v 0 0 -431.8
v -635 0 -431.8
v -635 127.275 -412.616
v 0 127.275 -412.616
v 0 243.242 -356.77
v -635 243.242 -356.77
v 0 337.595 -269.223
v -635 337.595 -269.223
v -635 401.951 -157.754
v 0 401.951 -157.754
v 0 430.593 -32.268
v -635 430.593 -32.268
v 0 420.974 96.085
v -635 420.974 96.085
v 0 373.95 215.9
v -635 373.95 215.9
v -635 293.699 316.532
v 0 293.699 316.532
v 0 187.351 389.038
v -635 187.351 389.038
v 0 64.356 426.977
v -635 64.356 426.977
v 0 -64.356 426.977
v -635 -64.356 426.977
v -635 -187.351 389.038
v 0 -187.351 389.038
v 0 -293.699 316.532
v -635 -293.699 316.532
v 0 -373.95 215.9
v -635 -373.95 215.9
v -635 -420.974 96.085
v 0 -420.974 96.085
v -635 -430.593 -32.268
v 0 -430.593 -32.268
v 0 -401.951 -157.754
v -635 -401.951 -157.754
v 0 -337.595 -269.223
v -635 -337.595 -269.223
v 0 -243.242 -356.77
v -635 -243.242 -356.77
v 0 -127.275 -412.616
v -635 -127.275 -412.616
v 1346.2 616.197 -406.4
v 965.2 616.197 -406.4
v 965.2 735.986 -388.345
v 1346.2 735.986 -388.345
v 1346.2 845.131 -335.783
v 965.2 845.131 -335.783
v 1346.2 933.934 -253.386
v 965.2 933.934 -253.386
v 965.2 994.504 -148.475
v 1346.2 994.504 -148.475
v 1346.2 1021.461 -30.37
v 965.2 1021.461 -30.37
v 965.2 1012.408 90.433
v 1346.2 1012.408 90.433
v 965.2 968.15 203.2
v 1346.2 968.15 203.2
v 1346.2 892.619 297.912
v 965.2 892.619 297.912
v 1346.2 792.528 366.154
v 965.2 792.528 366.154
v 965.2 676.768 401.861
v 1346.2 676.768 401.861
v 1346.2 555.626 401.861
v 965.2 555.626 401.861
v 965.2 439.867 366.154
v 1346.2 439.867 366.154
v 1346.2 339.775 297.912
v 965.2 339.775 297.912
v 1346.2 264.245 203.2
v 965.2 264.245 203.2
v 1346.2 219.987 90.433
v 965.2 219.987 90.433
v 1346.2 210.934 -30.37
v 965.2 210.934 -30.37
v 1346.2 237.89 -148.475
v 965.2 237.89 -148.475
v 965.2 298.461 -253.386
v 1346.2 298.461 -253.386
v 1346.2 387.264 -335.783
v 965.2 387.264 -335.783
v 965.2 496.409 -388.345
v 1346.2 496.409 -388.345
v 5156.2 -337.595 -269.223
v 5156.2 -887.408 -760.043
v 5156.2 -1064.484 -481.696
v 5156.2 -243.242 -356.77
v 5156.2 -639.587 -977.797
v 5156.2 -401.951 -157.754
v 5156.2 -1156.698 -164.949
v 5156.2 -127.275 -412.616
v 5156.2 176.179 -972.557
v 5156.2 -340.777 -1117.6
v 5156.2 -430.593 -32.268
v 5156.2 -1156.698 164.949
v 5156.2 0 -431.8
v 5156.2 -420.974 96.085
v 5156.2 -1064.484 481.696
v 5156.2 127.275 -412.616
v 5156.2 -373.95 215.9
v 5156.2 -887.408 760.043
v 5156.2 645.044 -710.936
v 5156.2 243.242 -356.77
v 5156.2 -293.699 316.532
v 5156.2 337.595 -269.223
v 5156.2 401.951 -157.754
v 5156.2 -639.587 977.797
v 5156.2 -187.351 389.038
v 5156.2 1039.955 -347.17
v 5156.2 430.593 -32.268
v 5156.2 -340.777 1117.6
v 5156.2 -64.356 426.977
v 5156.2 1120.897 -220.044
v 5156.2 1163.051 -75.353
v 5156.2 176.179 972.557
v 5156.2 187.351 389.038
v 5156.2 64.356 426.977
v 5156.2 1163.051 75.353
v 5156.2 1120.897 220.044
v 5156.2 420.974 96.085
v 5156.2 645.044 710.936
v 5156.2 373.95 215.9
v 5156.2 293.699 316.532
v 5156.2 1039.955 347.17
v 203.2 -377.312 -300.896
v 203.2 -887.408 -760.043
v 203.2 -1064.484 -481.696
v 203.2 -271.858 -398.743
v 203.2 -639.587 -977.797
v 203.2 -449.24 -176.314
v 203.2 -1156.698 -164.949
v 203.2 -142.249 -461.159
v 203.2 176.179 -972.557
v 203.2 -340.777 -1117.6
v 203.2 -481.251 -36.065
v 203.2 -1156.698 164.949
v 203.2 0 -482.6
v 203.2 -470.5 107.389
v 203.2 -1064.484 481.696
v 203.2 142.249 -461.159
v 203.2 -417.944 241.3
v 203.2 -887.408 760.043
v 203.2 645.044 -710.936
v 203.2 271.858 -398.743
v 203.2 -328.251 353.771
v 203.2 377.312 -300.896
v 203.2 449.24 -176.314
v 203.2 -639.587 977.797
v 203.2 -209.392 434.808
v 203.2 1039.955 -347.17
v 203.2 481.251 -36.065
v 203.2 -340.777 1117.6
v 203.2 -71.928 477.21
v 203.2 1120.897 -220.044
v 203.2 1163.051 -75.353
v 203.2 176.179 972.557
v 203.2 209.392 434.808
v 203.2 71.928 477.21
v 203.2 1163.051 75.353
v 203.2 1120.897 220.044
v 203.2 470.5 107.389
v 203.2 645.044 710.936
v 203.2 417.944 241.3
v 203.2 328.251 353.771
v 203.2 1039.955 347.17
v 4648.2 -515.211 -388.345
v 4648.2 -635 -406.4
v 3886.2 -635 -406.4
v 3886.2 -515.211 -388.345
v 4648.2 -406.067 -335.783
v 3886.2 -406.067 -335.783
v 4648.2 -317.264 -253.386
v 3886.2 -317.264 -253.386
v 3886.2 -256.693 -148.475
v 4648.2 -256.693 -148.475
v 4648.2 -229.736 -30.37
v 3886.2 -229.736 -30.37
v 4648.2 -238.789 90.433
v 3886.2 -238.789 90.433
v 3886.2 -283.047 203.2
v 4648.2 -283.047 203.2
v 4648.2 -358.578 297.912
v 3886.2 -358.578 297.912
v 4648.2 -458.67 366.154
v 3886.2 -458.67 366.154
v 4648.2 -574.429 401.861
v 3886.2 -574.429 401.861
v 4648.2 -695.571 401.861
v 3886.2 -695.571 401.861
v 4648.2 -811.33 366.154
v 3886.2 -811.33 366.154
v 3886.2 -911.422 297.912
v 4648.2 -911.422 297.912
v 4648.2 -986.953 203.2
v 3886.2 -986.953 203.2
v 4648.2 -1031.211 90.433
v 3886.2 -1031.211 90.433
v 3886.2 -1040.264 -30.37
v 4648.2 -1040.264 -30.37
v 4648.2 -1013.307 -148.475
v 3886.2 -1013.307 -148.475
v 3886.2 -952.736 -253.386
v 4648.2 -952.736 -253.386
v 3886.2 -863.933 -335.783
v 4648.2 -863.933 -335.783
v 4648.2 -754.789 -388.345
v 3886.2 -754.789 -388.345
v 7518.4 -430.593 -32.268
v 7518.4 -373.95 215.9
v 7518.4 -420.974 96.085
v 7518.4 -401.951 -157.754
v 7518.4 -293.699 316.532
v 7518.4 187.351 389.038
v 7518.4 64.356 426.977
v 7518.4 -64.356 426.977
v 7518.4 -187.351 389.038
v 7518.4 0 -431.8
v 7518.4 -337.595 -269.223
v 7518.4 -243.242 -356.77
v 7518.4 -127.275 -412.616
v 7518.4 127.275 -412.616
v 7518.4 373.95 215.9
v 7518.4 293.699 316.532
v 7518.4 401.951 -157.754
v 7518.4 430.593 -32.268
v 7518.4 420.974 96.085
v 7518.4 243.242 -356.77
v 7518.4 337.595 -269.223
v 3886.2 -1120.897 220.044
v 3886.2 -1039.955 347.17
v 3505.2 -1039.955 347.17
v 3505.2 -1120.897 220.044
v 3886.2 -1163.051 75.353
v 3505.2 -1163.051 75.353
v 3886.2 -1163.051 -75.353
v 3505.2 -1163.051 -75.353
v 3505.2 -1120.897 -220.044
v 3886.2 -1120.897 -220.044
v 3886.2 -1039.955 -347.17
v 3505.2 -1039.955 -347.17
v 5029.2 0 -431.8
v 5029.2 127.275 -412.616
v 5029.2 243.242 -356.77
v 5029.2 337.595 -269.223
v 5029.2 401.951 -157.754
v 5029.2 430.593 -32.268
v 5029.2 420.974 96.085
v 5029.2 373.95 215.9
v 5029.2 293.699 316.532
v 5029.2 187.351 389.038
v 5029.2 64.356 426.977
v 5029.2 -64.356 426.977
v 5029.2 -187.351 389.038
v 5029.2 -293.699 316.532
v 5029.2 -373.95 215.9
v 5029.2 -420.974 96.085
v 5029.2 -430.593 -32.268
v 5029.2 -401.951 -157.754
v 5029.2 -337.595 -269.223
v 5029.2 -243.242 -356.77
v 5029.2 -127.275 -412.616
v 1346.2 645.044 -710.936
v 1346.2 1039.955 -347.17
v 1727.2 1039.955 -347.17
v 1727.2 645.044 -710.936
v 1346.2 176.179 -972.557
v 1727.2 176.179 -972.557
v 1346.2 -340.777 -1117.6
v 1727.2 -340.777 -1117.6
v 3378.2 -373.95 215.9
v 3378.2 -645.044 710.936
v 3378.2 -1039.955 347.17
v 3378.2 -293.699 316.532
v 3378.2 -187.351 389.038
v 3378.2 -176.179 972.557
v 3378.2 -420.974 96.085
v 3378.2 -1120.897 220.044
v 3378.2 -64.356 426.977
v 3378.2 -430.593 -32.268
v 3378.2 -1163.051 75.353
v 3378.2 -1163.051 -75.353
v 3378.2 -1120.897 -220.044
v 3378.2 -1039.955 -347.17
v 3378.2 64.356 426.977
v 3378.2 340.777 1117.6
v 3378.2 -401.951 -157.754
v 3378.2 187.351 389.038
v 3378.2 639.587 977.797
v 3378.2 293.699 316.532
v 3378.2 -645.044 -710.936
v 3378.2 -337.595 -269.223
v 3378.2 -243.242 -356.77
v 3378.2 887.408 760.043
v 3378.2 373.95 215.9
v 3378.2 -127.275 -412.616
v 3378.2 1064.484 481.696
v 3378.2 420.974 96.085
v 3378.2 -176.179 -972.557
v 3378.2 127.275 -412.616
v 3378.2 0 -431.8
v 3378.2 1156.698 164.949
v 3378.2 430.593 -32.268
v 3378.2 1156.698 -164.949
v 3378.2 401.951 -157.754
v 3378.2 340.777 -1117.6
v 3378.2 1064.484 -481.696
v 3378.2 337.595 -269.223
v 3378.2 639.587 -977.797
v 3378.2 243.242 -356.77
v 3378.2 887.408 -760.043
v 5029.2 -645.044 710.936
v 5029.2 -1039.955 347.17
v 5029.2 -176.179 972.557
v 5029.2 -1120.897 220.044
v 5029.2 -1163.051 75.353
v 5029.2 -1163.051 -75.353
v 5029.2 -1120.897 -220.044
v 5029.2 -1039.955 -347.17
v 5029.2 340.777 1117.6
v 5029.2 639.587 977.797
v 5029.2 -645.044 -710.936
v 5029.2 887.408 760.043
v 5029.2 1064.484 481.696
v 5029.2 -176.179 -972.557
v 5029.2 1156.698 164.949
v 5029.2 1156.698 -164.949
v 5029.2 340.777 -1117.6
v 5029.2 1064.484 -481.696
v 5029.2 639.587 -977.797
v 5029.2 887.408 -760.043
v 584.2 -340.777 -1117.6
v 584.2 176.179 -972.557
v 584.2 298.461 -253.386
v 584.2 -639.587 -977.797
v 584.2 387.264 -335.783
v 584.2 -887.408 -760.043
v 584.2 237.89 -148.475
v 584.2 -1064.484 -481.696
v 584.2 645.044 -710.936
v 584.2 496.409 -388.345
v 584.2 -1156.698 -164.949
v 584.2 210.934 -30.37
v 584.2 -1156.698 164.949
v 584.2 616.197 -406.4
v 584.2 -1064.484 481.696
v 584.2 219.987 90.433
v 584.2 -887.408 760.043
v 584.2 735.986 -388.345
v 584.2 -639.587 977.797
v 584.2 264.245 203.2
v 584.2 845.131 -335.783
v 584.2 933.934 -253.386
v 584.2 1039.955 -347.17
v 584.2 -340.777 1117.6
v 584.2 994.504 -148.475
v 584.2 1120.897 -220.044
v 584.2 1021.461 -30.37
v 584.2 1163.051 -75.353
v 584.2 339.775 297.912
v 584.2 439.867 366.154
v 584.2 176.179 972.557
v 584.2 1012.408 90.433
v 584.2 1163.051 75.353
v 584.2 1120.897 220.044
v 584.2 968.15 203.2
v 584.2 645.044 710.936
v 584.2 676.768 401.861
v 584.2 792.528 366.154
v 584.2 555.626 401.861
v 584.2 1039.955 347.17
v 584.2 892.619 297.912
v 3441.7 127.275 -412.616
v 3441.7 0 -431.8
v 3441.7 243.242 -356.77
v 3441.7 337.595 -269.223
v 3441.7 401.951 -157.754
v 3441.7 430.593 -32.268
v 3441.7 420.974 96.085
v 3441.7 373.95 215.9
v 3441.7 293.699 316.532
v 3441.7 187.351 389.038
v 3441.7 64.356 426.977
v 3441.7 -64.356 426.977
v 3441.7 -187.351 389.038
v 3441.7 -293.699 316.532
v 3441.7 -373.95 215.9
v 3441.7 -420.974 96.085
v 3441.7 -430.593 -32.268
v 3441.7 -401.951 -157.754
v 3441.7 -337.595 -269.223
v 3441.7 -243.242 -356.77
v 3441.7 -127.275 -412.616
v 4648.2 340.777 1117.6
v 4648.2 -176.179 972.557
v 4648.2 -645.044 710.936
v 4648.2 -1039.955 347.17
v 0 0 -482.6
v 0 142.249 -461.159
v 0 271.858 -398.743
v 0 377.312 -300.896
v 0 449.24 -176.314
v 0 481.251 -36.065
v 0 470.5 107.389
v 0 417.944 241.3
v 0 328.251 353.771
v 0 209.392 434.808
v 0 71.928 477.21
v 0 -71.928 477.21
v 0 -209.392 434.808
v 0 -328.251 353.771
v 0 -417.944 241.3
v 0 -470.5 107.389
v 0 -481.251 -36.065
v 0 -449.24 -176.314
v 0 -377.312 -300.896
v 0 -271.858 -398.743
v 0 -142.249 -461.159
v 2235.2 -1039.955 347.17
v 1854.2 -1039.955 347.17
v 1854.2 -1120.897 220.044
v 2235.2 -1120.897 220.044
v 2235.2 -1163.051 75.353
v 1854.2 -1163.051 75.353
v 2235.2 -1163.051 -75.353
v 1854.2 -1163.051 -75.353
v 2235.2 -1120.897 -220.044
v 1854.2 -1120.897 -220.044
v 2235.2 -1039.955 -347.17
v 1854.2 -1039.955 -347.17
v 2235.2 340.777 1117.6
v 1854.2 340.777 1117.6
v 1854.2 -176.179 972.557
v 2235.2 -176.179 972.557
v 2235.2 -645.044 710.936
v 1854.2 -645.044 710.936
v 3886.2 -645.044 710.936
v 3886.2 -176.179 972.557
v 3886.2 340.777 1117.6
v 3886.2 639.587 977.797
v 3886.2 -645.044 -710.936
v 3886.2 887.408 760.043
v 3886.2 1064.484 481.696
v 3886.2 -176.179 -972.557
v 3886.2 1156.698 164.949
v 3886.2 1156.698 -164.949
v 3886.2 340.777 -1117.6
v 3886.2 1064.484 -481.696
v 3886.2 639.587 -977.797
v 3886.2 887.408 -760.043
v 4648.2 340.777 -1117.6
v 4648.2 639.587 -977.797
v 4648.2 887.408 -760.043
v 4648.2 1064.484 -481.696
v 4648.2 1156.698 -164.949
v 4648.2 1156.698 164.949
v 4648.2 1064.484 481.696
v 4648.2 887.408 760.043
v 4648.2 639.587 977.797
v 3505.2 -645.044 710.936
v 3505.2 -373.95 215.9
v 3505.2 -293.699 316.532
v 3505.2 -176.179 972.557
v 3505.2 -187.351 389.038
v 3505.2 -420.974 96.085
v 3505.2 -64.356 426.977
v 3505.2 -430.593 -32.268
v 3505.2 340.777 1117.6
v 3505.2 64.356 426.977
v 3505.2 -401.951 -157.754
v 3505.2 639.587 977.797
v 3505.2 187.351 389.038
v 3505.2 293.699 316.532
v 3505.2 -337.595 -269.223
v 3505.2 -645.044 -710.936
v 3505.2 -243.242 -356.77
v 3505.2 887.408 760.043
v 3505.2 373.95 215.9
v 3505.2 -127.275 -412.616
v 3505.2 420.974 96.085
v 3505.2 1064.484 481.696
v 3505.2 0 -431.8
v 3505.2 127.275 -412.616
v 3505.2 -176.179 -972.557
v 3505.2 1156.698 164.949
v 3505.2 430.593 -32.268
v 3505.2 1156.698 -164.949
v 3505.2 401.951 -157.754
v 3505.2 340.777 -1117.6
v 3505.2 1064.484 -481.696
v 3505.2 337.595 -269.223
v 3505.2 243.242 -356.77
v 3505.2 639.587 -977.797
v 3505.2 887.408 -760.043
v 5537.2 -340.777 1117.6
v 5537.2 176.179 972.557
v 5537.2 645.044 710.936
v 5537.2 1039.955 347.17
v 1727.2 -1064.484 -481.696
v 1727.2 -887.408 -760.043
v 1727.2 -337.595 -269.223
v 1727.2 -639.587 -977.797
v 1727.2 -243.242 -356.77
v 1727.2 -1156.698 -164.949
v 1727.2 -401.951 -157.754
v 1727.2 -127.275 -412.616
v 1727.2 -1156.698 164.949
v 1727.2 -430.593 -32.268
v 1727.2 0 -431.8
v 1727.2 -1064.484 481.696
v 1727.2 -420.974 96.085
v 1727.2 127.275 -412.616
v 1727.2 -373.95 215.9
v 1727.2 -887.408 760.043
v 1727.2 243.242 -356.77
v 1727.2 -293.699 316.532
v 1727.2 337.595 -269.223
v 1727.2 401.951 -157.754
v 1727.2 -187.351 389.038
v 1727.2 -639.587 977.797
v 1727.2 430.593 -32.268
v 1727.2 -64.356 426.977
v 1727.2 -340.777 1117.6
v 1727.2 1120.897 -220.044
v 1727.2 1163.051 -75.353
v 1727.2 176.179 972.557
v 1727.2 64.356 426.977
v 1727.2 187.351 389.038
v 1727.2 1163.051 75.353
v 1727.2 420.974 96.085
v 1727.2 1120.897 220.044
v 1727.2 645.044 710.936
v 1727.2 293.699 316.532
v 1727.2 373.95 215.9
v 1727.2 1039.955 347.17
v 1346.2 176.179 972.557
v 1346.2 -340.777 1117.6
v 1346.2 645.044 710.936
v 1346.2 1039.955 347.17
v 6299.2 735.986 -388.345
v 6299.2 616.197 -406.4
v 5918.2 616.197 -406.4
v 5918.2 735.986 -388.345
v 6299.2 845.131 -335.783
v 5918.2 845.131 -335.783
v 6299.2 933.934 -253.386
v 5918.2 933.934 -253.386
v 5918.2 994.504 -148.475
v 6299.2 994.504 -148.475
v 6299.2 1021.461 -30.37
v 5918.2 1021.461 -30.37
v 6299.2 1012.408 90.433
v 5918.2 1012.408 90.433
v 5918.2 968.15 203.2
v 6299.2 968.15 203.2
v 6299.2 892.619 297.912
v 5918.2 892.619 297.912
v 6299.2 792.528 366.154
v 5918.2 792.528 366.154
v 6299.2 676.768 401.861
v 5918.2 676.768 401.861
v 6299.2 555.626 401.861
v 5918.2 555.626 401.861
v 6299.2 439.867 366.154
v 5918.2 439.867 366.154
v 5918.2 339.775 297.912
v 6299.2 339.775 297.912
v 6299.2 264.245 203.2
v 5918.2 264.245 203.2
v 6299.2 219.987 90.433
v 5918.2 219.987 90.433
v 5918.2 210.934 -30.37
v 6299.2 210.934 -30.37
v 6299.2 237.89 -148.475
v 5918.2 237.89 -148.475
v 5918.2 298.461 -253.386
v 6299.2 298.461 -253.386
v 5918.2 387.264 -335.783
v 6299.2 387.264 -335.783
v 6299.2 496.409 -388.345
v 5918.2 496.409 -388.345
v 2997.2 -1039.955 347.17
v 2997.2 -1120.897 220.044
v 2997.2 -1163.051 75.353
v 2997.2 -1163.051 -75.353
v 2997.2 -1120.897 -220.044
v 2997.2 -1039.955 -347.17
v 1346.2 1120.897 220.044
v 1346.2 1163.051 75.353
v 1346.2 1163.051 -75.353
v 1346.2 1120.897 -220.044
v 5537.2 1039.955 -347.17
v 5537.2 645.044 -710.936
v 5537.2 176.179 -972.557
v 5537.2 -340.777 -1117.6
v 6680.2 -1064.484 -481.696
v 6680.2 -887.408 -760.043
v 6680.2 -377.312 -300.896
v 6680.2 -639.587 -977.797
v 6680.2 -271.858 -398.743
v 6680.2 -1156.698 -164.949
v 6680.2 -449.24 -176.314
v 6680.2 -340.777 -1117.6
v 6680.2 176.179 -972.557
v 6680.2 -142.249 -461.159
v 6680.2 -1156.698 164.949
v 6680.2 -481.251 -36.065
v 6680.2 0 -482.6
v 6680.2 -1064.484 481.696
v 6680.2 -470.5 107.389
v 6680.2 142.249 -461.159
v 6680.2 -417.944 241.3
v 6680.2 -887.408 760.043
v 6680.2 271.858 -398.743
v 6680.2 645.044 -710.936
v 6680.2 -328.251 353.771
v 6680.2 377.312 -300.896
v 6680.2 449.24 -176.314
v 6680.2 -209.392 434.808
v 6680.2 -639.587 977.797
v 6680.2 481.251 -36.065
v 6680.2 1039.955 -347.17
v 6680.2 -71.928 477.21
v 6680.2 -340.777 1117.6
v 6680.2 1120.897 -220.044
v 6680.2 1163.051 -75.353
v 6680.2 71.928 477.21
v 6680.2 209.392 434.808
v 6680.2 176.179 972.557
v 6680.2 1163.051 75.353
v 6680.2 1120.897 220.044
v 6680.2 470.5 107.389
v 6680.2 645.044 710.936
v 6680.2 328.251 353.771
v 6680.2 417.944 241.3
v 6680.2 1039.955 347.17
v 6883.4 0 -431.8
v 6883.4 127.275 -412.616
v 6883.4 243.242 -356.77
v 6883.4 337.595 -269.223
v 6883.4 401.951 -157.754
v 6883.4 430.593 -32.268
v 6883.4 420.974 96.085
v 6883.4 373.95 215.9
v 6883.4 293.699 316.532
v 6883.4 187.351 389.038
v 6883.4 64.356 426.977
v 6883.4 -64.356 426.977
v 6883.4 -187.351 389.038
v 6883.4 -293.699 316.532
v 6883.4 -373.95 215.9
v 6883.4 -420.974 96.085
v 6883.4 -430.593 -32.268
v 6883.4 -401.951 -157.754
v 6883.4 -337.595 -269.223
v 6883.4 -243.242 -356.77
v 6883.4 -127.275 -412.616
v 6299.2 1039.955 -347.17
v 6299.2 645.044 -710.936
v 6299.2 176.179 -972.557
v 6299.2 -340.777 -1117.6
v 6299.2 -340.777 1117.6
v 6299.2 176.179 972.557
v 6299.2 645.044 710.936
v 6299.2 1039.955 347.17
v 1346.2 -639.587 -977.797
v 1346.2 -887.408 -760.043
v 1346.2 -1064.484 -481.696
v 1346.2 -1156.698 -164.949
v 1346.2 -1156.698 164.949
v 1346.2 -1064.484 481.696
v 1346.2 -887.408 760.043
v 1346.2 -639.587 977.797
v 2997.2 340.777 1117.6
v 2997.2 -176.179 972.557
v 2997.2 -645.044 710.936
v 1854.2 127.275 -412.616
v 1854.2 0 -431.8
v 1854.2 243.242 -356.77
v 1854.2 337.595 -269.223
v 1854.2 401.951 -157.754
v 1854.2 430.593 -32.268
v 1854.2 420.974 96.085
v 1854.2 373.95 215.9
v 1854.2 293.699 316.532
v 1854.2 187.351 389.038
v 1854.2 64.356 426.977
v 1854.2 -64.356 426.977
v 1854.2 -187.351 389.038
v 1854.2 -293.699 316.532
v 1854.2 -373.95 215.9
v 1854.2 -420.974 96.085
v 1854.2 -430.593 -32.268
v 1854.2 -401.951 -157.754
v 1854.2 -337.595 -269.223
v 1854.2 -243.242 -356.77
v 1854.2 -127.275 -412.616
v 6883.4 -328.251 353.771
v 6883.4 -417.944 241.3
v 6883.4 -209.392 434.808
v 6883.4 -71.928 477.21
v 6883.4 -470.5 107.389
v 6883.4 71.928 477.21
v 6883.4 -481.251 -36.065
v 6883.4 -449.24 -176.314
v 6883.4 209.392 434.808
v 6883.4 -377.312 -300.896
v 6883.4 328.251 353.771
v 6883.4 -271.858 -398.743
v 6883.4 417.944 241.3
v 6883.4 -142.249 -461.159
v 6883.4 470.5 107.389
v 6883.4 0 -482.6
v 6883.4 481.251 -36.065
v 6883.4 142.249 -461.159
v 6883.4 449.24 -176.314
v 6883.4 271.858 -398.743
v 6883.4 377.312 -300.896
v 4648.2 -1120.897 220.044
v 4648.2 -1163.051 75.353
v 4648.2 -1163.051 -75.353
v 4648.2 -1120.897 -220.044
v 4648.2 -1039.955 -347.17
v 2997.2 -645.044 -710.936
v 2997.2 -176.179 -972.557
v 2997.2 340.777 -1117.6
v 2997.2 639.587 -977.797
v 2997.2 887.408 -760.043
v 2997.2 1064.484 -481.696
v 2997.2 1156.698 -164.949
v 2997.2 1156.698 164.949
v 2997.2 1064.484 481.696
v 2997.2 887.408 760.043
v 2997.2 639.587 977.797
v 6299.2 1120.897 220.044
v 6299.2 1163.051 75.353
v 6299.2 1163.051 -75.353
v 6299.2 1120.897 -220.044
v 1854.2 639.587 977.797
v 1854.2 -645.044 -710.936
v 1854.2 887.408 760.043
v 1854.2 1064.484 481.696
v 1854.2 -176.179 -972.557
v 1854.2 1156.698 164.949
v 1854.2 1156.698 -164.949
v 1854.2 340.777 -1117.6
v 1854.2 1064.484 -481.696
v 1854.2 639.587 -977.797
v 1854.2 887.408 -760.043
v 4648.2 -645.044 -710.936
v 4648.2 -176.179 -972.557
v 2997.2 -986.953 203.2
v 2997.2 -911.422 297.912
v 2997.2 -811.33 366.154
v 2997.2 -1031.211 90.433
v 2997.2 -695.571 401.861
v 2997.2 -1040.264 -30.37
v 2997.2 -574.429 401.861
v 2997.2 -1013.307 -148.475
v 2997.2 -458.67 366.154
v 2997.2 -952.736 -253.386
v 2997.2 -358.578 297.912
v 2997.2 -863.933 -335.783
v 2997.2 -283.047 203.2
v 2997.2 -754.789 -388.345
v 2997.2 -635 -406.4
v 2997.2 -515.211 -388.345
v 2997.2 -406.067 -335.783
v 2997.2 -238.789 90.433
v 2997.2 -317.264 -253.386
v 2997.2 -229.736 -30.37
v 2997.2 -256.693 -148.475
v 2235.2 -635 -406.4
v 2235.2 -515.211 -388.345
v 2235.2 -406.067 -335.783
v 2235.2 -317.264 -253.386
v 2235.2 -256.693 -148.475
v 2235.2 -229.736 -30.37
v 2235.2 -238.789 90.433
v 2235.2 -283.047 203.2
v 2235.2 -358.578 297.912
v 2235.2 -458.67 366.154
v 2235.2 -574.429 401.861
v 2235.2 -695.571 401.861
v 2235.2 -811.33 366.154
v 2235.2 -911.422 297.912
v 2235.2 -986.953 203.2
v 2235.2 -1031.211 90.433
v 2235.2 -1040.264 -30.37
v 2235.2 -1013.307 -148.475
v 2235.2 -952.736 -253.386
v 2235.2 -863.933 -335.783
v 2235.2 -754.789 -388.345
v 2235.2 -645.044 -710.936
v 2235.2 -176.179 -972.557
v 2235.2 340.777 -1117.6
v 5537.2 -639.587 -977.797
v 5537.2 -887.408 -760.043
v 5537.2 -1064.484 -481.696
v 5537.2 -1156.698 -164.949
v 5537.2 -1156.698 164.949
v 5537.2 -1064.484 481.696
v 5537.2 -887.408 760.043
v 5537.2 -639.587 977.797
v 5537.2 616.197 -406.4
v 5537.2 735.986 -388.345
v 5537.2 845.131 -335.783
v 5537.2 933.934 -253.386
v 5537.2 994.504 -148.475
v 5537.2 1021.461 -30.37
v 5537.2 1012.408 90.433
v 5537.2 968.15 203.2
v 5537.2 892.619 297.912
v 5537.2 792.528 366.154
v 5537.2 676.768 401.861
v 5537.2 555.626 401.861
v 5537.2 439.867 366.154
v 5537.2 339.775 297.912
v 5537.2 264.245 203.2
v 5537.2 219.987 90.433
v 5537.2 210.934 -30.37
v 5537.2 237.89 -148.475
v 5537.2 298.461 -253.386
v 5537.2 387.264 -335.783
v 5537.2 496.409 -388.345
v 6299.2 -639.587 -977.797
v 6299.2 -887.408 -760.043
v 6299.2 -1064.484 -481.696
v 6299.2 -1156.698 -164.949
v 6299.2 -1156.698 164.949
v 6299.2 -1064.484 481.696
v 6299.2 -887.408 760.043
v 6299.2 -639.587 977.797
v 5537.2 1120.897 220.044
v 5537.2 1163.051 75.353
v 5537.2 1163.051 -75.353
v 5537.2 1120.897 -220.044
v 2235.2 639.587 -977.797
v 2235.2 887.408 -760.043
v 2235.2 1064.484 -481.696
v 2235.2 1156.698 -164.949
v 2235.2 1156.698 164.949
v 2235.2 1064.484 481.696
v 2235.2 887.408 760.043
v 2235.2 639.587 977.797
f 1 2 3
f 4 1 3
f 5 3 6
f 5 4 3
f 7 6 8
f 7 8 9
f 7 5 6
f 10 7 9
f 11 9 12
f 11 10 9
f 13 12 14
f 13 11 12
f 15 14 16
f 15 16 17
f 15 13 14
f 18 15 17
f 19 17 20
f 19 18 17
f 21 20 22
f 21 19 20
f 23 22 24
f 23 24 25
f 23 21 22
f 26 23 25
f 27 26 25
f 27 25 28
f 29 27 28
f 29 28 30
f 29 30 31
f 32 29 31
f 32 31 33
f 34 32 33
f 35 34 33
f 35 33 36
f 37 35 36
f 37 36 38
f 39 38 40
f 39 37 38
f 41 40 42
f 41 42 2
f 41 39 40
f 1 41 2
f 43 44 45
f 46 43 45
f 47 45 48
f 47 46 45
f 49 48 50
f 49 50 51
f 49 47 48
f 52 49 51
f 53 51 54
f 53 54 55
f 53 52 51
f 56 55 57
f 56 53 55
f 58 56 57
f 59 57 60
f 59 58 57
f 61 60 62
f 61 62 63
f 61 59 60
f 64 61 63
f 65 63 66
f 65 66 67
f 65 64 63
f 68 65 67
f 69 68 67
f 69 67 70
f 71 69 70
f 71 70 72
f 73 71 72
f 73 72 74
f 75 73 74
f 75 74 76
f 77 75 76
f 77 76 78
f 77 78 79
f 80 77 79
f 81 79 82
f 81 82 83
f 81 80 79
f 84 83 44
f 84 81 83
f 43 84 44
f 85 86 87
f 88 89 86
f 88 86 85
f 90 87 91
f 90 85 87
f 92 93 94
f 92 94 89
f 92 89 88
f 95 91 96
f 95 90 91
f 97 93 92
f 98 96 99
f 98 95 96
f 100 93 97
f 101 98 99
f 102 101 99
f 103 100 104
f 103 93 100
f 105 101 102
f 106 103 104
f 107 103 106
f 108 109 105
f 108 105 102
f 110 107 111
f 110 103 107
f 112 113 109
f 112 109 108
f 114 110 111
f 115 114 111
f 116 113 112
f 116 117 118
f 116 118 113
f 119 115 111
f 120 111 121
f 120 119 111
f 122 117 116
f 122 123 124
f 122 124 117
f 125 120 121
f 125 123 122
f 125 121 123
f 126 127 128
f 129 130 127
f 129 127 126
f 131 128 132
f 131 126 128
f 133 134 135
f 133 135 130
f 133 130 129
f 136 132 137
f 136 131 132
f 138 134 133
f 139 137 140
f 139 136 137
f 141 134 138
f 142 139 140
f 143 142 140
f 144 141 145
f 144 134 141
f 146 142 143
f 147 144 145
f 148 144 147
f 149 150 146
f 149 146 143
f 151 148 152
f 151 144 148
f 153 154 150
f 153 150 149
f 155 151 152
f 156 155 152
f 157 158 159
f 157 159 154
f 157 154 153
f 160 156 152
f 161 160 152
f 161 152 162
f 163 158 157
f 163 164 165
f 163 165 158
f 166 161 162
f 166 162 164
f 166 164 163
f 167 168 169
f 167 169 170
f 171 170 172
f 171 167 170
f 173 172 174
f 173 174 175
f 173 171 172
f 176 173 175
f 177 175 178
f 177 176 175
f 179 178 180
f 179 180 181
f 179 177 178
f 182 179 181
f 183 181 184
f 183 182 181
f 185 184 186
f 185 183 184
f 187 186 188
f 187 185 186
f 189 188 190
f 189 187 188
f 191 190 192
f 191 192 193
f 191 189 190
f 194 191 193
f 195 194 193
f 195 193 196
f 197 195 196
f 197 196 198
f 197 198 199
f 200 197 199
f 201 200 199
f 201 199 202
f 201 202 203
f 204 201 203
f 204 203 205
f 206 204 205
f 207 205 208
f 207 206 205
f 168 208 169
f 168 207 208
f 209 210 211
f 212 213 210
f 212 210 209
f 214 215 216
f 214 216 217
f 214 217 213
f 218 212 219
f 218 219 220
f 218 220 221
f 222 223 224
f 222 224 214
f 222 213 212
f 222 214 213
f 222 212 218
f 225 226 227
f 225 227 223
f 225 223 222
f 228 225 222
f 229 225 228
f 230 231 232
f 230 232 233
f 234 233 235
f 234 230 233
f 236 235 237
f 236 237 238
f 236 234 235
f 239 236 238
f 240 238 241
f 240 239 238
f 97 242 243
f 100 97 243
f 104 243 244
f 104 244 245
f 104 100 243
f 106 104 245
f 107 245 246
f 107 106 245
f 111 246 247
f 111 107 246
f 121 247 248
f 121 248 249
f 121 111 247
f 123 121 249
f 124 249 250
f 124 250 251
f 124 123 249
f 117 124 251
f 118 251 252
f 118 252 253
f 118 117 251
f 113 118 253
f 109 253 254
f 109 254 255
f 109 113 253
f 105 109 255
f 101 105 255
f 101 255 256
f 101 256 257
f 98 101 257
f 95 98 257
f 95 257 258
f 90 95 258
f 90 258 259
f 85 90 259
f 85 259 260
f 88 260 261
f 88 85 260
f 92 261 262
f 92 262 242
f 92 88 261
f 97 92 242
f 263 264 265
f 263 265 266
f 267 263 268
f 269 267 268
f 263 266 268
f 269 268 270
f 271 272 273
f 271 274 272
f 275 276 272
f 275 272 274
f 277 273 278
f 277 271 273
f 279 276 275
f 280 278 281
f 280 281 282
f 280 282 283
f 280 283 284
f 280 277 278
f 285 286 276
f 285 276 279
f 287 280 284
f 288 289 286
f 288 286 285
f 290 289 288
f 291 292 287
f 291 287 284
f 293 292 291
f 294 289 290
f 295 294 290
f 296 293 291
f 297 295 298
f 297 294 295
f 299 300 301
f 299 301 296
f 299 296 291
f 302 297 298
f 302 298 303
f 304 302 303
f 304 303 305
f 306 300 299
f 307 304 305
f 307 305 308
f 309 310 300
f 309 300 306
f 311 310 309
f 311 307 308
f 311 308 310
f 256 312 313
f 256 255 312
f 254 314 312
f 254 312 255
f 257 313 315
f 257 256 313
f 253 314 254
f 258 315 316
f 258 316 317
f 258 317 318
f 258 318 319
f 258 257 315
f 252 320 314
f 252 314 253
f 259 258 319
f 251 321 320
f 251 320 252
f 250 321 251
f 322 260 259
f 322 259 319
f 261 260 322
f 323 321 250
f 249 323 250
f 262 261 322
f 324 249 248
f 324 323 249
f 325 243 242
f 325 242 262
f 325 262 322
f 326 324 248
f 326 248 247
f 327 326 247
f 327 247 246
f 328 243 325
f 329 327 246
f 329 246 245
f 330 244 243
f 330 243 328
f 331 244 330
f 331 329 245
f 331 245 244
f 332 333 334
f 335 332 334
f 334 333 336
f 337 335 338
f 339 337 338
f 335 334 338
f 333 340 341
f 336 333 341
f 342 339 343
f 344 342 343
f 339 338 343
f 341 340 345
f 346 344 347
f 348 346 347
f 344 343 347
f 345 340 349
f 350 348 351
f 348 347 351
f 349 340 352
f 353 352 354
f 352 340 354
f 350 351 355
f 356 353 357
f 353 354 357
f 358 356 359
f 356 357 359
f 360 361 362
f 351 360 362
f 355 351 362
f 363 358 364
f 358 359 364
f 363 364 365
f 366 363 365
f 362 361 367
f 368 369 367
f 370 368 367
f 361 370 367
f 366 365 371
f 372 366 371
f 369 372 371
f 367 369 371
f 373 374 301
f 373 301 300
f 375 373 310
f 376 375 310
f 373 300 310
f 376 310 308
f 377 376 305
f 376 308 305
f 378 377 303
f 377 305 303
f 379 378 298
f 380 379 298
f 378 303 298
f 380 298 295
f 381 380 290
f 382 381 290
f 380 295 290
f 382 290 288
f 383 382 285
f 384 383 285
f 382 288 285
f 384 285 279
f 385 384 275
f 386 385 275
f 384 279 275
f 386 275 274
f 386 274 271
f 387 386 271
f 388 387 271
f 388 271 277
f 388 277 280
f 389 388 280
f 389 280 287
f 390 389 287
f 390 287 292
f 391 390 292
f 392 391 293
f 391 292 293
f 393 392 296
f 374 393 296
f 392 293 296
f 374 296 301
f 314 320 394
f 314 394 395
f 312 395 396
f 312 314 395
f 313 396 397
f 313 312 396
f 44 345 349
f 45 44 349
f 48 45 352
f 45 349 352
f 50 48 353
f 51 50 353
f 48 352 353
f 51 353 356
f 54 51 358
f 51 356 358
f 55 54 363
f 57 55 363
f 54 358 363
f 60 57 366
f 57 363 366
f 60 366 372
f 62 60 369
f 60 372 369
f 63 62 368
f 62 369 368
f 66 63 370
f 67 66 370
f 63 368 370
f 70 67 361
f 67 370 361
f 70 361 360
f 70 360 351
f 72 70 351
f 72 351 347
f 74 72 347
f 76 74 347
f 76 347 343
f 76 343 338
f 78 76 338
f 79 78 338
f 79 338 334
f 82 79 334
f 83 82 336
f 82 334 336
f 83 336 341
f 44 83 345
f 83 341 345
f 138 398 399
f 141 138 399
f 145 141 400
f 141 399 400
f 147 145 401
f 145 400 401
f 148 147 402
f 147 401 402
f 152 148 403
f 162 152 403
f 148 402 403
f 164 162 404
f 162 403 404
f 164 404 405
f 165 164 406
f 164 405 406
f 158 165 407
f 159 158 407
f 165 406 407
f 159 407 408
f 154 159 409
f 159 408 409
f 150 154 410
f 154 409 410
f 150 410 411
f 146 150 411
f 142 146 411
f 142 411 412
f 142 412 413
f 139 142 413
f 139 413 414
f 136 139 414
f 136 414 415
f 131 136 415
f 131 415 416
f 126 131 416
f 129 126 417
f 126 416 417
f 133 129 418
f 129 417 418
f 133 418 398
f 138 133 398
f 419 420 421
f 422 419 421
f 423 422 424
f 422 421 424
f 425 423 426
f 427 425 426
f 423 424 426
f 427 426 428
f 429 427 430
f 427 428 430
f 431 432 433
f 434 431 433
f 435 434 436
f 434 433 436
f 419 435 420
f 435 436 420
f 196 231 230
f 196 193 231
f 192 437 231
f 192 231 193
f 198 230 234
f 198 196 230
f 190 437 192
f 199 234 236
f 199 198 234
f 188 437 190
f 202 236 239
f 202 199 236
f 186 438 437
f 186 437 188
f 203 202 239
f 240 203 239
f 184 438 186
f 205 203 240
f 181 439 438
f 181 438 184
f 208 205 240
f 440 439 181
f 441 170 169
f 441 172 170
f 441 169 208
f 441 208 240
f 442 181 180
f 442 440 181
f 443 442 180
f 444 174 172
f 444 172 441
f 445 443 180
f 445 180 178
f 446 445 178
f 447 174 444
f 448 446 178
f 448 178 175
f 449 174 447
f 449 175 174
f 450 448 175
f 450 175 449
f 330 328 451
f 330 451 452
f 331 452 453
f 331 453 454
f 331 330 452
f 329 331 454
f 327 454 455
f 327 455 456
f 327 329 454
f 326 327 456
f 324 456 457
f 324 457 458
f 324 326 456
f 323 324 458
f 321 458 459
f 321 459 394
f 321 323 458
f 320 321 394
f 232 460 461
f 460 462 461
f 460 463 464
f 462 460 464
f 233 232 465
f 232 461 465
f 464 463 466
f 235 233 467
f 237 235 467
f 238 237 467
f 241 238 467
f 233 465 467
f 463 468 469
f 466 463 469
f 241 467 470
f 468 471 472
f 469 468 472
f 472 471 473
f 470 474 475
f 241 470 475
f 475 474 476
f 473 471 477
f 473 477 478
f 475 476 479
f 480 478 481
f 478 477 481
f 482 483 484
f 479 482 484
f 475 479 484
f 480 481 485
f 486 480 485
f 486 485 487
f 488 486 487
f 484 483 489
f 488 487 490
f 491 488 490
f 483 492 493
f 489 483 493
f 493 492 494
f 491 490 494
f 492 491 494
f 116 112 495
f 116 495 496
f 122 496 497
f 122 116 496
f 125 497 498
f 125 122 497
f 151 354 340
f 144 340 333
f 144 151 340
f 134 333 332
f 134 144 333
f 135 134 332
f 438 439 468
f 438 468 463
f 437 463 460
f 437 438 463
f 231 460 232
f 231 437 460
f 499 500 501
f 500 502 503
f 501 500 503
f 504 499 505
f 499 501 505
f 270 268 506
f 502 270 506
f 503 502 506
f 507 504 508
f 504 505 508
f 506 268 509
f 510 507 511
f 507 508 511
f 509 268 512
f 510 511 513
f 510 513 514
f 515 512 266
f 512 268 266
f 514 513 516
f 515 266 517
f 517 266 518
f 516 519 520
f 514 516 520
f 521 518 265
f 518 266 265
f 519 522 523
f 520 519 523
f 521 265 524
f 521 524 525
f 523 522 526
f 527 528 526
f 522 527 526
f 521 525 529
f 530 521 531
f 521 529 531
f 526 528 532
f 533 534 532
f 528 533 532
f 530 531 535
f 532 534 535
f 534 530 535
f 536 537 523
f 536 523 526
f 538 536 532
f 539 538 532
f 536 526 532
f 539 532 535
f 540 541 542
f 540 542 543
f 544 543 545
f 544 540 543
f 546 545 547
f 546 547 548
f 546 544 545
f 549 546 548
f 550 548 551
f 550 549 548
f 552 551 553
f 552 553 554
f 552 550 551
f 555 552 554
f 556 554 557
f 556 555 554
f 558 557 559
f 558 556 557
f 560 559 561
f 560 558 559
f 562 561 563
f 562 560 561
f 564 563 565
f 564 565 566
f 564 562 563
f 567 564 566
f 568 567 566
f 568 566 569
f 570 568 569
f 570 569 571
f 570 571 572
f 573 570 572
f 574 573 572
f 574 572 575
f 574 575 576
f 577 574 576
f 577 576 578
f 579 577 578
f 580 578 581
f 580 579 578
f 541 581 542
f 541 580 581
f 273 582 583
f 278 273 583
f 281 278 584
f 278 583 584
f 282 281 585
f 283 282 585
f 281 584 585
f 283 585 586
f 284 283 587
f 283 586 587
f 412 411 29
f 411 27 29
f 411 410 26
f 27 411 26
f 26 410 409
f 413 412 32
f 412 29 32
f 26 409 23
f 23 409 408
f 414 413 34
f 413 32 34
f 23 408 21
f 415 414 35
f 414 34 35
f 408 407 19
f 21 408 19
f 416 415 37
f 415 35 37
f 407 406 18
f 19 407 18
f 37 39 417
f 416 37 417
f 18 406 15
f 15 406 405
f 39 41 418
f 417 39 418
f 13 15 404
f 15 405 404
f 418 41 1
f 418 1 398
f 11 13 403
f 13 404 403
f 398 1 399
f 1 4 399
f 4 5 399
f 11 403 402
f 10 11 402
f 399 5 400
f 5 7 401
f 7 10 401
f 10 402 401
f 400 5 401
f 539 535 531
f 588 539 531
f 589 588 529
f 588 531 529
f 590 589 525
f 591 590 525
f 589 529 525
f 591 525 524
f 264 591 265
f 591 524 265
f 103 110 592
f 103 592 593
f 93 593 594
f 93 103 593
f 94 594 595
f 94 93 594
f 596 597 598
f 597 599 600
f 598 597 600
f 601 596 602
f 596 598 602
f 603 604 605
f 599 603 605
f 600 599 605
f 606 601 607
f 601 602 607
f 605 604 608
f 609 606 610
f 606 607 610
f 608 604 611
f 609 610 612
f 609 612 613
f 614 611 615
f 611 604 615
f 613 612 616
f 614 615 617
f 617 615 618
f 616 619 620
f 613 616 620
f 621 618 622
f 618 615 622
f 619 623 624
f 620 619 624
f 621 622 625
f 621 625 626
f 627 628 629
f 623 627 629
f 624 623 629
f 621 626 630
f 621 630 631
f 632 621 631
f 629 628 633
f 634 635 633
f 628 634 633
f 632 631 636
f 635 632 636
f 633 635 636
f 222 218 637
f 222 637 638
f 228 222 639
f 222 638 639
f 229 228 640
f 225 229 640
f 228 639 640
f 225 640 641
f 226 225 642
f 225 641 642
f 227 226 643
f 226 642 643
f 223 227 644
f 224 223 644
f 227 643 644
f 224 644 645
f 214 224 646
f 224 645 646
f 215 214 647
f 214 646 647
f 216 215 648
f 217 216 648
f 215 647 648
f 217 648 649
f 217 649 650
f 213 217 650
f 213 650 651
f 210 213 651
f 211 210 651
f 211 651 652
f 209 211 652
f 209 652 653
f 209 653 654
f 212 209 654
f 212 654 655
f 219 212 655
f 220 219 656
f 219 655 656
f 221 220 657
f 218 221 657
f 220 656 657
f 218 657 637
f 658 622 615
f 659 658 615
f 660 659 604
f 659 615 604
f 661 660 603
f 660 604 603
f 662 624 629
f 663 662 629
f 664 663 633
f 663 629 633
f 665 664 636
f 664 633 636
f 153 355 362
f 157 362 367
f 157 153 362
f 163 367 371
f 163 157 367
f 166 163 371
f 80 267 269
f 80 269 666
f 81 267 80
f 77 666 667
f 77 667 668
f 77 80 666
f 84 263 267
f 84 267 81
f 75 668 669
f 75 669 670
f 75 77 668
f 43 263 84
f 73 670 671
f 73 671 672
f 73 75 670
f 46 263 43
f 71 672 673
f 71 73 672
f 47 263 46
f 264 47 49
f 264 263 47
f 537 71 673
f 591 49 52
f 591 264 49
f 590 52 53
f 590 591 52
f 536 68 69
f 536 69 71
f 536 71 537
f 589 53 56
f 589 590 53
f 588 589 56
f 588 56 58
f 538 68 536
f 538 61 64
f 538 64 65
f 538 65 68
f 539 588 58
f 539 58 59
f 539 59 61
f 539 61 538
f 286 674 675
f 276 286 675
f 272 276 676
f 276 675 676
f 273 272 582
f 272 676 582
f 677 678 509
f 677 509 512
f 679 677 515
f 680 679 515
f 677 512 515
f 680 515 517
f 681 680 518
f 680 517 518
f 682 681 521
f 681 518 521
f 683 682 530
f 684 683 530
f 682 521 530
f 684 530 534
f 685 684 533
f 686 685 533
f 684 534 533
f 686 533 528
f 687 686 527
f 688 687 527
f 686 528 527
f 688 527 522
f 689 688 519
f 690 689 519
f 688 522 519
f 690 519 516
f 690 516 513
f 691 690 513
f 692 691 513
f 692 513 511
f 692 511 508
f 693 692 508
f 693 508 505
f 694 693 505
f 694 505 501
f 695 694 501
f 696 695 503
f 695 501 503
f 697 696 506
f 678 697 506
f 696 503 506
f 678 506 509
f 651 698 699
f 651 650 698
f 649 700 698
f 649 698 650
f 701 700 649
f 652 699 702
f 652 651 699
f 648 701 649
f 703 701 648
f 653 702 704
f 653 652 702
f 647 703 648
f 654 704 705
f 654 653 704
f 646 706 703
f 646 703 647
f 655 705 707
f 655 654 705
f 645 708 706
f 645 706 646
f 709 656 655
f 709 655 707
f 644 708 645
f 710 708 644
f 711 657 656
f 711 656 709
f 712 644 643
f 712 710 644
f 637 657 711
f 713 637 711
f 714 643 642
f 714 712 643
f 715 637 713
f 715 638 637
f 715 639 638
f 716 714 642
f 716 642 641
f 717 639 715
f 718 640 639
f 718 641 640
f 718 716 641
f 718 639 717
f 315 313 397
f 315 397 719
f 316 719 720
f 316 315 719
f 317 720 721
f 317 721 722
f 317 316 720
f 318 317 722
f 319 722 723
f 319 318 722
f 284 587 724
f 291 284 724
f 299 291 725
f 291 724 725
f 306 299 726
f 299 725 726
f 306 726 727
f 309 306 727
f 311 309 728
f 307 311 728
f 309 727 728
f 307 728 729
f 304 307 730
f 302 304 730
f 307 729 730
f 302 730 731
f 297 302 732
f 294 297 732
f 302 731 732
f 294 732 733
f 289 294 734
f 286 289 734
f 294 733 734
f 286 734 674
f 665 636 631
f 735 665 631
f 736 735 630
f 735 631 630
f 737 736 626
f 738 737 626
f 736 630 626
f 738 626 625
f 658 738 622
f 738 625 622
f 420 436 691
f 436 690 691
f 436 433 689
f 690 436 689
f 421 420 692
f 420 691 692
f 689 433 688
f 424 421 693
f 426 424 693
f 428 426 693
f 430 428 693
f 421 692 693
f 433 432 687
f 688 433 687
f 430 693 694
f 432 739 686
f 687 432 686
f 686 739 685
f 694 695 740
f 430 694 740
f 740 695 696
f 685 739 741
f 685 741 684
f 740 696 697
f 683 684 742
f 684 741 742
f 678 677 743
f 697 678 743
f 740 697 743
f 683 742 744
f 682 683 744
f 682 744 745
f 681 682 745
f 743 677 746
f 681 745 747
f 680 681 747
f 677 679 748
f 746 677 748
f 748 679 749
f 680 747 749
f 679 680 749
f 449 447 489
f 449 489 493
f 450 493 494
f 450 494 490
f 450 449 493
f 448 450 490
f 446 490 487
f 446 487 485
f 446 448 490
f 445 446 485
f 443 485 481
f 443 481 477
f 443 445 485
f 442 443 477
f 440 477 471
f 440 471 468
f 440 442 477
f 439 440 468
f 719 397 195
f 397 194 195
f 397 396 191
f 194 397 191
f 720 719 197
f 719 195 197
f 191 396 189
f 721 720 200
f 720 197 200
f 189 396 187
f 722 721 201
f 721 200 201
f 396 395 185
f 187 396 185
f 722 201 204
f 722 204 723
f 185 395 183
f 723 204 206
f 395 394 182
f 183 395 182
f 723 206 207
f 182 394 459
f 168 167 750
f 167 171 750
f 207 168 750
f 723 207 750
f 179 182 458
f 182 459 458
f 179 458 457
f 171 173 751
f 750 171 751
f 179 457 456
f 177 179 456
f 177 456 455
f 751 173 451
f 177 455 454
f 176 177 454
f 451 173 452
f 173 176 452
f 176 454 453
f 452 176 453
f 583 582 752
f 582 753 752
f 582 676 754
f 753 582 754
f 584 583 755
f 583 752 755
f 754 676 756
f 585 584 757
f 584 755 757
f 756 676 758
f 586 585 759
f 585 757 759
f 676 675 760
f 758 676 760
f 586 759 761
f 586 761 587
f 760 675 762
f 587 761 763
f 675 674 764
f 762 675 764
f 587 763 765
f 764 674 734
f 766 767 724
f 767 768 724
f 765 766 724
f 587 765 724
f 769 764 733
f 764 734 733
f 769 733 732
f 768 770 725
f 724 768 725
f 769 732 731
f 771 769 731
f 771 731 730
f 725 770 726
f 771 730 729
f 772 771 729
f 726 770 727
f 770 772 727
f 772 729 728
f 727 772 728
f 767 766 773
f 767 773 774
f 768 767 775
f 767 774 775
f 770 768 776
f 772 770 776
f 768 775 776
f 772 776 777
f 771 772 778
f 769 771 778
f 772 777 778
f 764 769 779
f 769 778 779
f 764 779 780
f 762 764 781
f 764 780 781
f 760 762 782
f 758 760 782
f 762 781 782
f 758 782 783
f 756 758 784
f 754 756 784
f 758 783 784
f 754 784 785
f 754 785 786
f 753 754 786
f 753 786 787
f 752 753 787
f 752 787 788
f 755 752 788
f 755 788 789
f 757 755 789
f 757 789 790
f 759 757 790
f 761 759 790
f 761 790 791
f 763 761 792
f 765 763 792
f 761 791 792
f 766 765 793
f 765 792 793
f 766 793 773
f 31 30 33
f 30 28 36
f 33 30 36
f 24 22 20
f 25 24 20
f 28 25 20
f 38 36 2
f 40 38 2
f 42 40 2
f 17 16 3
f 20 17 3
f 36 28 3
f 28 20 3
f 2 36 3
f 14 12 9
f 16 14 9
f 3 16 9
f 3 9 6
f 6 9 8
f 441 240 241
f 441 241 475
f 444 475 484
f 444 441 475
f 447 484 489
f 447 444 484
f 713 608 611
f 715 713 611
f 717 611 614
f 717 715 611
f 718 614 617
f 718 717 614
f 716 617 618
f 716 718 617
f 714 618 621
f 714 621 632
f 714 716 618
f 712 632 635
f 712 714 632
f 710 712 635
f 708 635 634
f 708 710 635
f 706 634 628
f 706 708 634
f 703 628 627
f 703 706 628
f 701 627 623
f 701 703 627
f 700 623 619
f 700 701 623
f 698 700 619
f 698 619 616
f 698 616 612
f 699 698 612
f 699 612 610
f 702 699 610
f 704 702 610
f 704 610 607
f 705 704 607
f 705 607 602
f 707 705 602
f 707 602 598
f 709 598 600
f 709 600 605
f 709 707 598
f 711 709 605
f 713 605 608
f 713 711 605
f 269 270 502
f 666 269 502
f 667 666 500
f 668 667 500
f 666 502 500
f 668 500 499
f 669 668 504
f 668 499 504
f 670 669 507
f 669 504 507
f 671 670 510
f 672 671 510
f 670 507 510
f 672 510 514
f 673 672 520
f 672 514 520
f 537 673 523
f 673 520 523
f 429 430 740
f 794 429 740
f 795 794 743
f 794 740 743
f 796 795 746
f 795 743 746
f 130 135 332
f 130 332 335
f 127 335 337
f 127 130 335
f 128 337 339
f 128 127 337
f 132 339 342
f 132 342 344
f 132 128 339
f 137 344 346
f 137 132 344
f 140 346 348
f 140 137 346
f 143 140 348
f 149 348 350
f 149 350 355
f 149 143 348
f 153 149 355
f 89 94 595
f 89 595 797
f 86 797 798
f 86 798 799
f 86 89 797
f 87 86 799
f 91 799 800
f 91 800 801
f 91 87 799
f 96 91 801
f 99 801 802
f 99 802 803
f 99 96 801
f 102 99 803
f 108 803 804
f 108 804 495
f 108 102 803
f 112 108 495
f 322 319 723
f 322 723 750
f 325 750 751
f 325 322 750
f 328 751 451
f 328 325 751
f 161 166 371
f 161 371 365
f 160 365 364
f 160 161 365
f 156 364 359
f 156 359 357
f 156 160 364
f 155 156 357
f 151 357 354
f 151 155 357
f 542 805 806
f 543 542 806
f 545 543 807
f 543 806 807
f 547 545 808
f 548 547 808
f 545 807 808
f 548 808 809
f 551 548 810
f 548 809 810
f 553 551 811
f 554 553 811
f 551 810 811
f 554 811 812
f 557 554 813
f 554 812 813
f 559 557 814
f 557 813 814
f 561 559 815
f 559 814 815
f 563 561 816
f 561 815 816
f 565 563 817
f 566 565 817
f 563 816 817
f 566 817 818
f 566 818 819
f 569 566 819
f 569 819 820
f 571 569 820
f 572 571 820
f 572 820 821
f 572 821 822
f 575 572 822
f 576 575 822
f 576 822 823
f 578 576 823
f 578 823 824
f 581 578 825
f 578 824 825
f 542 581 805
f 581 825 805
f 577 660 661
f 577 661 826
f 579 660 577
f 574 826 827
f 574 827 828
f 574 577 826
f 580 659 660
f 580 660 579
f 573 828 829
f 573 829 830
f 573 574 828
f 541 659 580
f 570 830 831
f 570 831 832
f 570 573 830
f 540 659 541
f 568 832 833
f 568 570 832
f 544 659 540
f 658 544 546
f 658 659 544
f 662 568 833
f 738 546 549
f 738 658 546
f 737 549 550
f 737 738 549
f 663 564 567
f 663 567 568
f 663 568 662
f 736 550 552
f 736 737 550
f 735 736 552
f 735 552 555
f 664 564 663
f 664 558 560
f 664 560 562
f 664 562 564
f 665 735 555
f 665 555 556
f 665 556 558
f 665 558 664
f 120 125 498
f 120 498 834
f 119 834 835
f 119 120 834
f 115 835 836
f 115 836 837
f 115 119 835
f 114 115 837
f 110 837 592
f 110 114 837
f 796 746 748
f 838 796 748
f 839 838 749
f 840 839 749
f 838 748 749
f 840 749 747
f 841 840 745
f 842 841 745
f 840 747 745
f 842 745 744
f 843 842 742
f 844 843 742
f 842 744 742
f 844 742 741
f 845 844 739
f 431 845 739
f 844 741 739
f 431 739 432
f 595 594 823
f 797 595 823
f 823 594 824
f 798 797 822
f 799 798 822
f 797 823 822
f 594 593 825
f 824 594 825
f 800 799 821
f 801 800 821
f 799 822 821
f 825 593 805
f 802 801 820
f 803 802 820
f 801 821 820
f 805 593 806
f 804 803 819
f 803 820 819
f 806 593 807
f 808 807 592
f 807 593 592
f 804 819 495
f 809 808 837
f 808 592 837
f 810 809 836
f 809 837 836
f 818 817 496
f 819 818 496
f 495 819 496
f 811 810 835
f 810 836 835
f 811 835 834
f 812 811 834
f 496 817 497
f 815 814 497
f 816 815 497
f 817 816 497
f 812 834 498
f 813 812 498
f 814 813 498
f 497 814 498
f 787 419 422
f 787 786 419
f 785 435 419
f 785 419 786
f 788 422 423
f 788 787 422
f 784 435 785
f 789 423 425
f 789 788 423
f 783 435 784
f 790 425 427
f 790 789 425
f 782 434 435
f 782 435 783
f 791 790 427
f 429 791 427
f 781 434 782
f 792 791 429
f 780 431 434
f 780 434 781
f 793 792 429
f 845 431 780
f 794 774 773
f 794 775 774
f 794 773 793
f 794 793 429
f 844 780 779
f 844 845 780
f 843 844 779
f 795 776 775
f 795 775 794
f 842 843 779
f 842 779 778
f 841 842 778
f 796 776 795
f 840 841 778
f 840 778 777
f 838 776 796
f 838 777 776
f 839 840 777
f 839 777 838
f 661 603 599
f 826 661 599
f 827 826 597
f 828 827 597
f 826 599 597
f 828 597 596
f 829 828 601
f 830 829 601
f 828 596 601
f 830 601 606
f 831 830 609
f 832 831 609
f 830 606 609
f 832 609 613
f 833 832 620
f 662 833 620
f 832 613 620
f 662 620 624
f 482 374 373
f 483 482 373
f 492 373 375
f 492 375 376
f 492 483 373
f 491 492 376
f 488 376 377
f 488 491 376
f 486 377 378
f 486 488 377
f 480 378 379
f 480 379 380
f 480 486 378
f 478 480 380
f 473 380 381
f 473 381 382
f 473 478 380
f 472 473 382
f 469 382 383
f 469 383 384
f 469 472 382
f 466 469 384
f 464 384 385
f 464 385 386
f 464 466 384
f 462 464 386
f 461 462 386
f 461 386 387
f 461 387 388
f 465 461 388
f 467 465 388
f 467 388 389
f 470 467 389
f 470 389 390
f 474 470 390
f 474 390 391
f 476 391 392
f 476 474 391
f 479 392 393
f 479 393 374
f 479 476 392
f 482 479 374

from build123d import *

# Parameters (mm, degrees)
SKETCH1_R           = 431.8
BOSS_EXTRUDE1_DEPTH = 635
SKETCH1_3_R         = 482.6
BOSS_EXTRUDE2_DEPTH = 203.2
BOSS_EXTRUDE3_DEPTH = 381
SKETCH3_R           = 406.4
BOSS_EXTRUDE4_DEPTH = 381
BOSS_EXTRUDE5_START = 127
SKETCH4_R           = 431.8
BOSS_EXTRUDE5_DEPTH = 127
BOSS_EXTRUDE6_DEPTH = 381
SKETCH6_R           = 406.4
BOSS_EXTRUDE7_DEPTH = 762
BOSS_EXTRUDE8_DEPTH = 381
BOSS_EXTRUDE9_START = 63.5
SKETCH8_R           = 431.8
BOSS_EXTRUDE9_DEPTH = 63.5


with BuildPart() as part:
    # Sketch1 → Boss-Extrude1 (new body)
    with BuildSketch(Plane(origin=(0, 0, 0), x_dir=(0, 0, -1), z_dir=(1, 0, 0))):
        Circle(SKETCH1_R)
    extrude(amount=-BOSS_EXTRUDE1_DEPTH)

    # Sketch1<3> → Boss-Extrude2 (add)
    with BuildSketch(Plane(origin=(0, 0, 0), x_dir=(0, 0, -1), z_dir=(1, 0, 0))):
        Circle(SKETCH1_3_R)
    extrude(amount=BOSS_EXTRUDE2_DEPTH)

    # Sketch2 → Boss-Extrude3 (add)
    with BuildSketch(Plane(origin=(203.2, 0, 0), x_dir=(0, 0, -1), z_dir=(1, 0, 0))):
        with BuildLine():
            ThreePointArc((-347.169606843, 1039.955335913), (0, 1168.4), (347.169606843, 1039.955335913))
            ThreePointArc((347.169606843, 1039.955335913), (855.559483917, 418.319143644), (1117.6, -340.776759771))
            ThreePointArc((1117.6, -340.776759771), (0, -1168.4), (-1117.6, -340.776759771))
            ThreePointArc((-1117.6, -340.776759771), (-855.559483917, 418.319143644), (-347.169606843, 1039.955335913))
        make_face()
    boss_extrude3 = extrude(amount=BOSS_EXTRUDE3_DEPTH)

    # Sketch3 → Boss-Extrude4 (add)
    with BuildSketch(Plane(origin=(584.2, 0, 0), x_dir=(0, 0, -1), z_dir=(1, 0, 0))):
        with Locations((0, 616.197244193)):
            Circle(SKETCH3_R)
    boss_extrude4 = extrude(amount=BOSS_EXTRUDE4_DEPTH)

    # Mirror2: Boss-Extrude3, Boss-Extrude4 across plane
    add(boss_extrude3.mirror(Plane(origin=(965.2, 616.197244193, 0), x_dir=(0, 0, 1), z_dir=(1, 0, 0))))
    add(boss_extrude4.mirror(Plane(origin=(965.2, 616.197244193, 0), x_dir=(0, 0, 1), z_dir=(1, 0, 0))))

    # Sketch4 → Boss-Extrude5 (add)
    with BuildSketch(Plane(origin=(1727.2, 0, 0), x_dir=(0, 0, -1), z_dir=(1, 0, 0)).offset(BOSS_EXTRUDE5_START)):
        Circle(SKETCH4_R)
    extrude(amount=-BOSS_EXTRUDE5_DEPTH)

    # Sketch5 → Boss-Extrude6 (add)
    with BuildSketch(Plane(origin=(1854.2, 0, 0), x_dir=(0, 0, -1), z_dir=(1, 0, 0))):
        with BuildLine():
            ThreePointArc((-347.169606843, -1039.955335913), (0, -1168.4), (347.169606843, -1039.955335913))
            ThreePointArc((347.169606843, -1039.955335913), (855.559483917, -418.319143644), (1117.6, 340.776759771))
            ThreePointArc((1117.6, 340.776759771), (0, 1168.4), (-1117.6, 340.776759771))
            ThreePointArc((-1117.6, 340.776759771), (-855.559483917, -418.319143644), (-347.169606843, -1039.955335913))
        make_face()
    extrude(amount=BOSS_EXTRUDE6_DEPTH)

    # Sketch6 → Boss-Extrude7 (add)
    with BuildSketch(Plane(origin=(2235.2, 0, 0), x_dir=(0, 0, -1), z_dir=(1, 0, 0))):
        with Locations((0, -635)):
            Circle(SKETCH6_R)
    extrude(amount=BOSS_EXTRUDE7_DEPTH)

    # Sketch7 → Boss-Extrude8 (add)
    with BuildSketch(Plane(origin=(2997.2, 0, 0), x_dir=(0, 0, -1), z_dir=(1, 0, 0))):
        with BuildLine():
            ThreePointArc((-347.169606843, -1039.955335913), (0, -1168.4), (347.169606843, -1039.955335913))
            ThreePointArc((347.169606843, -1039.955335913), (855.559483917, -418.319143644), (1117.6, 340.776759771))
            ThreePointArc((1117.6, 340.776759771), (0, 1168.4), (-1117.6, 340.776759771))
            ThreePointArc((-1117.6, 340.776759771), (-855.559483917, -418.319143644), (-347.169606843, -1039.955335913))
        make_face()
    extrude(amount=BOSS_EXTRUDE8_DEPTH)

    # Sketch8 → Boss-Extrude9 (add)
    with BuildSketch(Plane(origin=(3378.2, 0, 0), x_dir=(0, 0, -1), z_dir=(1, 0, 0)).offset(BOSS_EXTRUDE9_START)):
        Circle(SKETCH8_R)
    extrude(amount=-BOSS_EXTRUDE9_DEPTH)

    # Mirror3: part across plane


with BuildPart() as part_1:
    add(part.part)
    add(part.part.mirror(Plane(origin=(3441.7, 0, 0), x_dir=(0, 0, 1), z_dir=(1, 0, 0))))


solid = part_1.part
